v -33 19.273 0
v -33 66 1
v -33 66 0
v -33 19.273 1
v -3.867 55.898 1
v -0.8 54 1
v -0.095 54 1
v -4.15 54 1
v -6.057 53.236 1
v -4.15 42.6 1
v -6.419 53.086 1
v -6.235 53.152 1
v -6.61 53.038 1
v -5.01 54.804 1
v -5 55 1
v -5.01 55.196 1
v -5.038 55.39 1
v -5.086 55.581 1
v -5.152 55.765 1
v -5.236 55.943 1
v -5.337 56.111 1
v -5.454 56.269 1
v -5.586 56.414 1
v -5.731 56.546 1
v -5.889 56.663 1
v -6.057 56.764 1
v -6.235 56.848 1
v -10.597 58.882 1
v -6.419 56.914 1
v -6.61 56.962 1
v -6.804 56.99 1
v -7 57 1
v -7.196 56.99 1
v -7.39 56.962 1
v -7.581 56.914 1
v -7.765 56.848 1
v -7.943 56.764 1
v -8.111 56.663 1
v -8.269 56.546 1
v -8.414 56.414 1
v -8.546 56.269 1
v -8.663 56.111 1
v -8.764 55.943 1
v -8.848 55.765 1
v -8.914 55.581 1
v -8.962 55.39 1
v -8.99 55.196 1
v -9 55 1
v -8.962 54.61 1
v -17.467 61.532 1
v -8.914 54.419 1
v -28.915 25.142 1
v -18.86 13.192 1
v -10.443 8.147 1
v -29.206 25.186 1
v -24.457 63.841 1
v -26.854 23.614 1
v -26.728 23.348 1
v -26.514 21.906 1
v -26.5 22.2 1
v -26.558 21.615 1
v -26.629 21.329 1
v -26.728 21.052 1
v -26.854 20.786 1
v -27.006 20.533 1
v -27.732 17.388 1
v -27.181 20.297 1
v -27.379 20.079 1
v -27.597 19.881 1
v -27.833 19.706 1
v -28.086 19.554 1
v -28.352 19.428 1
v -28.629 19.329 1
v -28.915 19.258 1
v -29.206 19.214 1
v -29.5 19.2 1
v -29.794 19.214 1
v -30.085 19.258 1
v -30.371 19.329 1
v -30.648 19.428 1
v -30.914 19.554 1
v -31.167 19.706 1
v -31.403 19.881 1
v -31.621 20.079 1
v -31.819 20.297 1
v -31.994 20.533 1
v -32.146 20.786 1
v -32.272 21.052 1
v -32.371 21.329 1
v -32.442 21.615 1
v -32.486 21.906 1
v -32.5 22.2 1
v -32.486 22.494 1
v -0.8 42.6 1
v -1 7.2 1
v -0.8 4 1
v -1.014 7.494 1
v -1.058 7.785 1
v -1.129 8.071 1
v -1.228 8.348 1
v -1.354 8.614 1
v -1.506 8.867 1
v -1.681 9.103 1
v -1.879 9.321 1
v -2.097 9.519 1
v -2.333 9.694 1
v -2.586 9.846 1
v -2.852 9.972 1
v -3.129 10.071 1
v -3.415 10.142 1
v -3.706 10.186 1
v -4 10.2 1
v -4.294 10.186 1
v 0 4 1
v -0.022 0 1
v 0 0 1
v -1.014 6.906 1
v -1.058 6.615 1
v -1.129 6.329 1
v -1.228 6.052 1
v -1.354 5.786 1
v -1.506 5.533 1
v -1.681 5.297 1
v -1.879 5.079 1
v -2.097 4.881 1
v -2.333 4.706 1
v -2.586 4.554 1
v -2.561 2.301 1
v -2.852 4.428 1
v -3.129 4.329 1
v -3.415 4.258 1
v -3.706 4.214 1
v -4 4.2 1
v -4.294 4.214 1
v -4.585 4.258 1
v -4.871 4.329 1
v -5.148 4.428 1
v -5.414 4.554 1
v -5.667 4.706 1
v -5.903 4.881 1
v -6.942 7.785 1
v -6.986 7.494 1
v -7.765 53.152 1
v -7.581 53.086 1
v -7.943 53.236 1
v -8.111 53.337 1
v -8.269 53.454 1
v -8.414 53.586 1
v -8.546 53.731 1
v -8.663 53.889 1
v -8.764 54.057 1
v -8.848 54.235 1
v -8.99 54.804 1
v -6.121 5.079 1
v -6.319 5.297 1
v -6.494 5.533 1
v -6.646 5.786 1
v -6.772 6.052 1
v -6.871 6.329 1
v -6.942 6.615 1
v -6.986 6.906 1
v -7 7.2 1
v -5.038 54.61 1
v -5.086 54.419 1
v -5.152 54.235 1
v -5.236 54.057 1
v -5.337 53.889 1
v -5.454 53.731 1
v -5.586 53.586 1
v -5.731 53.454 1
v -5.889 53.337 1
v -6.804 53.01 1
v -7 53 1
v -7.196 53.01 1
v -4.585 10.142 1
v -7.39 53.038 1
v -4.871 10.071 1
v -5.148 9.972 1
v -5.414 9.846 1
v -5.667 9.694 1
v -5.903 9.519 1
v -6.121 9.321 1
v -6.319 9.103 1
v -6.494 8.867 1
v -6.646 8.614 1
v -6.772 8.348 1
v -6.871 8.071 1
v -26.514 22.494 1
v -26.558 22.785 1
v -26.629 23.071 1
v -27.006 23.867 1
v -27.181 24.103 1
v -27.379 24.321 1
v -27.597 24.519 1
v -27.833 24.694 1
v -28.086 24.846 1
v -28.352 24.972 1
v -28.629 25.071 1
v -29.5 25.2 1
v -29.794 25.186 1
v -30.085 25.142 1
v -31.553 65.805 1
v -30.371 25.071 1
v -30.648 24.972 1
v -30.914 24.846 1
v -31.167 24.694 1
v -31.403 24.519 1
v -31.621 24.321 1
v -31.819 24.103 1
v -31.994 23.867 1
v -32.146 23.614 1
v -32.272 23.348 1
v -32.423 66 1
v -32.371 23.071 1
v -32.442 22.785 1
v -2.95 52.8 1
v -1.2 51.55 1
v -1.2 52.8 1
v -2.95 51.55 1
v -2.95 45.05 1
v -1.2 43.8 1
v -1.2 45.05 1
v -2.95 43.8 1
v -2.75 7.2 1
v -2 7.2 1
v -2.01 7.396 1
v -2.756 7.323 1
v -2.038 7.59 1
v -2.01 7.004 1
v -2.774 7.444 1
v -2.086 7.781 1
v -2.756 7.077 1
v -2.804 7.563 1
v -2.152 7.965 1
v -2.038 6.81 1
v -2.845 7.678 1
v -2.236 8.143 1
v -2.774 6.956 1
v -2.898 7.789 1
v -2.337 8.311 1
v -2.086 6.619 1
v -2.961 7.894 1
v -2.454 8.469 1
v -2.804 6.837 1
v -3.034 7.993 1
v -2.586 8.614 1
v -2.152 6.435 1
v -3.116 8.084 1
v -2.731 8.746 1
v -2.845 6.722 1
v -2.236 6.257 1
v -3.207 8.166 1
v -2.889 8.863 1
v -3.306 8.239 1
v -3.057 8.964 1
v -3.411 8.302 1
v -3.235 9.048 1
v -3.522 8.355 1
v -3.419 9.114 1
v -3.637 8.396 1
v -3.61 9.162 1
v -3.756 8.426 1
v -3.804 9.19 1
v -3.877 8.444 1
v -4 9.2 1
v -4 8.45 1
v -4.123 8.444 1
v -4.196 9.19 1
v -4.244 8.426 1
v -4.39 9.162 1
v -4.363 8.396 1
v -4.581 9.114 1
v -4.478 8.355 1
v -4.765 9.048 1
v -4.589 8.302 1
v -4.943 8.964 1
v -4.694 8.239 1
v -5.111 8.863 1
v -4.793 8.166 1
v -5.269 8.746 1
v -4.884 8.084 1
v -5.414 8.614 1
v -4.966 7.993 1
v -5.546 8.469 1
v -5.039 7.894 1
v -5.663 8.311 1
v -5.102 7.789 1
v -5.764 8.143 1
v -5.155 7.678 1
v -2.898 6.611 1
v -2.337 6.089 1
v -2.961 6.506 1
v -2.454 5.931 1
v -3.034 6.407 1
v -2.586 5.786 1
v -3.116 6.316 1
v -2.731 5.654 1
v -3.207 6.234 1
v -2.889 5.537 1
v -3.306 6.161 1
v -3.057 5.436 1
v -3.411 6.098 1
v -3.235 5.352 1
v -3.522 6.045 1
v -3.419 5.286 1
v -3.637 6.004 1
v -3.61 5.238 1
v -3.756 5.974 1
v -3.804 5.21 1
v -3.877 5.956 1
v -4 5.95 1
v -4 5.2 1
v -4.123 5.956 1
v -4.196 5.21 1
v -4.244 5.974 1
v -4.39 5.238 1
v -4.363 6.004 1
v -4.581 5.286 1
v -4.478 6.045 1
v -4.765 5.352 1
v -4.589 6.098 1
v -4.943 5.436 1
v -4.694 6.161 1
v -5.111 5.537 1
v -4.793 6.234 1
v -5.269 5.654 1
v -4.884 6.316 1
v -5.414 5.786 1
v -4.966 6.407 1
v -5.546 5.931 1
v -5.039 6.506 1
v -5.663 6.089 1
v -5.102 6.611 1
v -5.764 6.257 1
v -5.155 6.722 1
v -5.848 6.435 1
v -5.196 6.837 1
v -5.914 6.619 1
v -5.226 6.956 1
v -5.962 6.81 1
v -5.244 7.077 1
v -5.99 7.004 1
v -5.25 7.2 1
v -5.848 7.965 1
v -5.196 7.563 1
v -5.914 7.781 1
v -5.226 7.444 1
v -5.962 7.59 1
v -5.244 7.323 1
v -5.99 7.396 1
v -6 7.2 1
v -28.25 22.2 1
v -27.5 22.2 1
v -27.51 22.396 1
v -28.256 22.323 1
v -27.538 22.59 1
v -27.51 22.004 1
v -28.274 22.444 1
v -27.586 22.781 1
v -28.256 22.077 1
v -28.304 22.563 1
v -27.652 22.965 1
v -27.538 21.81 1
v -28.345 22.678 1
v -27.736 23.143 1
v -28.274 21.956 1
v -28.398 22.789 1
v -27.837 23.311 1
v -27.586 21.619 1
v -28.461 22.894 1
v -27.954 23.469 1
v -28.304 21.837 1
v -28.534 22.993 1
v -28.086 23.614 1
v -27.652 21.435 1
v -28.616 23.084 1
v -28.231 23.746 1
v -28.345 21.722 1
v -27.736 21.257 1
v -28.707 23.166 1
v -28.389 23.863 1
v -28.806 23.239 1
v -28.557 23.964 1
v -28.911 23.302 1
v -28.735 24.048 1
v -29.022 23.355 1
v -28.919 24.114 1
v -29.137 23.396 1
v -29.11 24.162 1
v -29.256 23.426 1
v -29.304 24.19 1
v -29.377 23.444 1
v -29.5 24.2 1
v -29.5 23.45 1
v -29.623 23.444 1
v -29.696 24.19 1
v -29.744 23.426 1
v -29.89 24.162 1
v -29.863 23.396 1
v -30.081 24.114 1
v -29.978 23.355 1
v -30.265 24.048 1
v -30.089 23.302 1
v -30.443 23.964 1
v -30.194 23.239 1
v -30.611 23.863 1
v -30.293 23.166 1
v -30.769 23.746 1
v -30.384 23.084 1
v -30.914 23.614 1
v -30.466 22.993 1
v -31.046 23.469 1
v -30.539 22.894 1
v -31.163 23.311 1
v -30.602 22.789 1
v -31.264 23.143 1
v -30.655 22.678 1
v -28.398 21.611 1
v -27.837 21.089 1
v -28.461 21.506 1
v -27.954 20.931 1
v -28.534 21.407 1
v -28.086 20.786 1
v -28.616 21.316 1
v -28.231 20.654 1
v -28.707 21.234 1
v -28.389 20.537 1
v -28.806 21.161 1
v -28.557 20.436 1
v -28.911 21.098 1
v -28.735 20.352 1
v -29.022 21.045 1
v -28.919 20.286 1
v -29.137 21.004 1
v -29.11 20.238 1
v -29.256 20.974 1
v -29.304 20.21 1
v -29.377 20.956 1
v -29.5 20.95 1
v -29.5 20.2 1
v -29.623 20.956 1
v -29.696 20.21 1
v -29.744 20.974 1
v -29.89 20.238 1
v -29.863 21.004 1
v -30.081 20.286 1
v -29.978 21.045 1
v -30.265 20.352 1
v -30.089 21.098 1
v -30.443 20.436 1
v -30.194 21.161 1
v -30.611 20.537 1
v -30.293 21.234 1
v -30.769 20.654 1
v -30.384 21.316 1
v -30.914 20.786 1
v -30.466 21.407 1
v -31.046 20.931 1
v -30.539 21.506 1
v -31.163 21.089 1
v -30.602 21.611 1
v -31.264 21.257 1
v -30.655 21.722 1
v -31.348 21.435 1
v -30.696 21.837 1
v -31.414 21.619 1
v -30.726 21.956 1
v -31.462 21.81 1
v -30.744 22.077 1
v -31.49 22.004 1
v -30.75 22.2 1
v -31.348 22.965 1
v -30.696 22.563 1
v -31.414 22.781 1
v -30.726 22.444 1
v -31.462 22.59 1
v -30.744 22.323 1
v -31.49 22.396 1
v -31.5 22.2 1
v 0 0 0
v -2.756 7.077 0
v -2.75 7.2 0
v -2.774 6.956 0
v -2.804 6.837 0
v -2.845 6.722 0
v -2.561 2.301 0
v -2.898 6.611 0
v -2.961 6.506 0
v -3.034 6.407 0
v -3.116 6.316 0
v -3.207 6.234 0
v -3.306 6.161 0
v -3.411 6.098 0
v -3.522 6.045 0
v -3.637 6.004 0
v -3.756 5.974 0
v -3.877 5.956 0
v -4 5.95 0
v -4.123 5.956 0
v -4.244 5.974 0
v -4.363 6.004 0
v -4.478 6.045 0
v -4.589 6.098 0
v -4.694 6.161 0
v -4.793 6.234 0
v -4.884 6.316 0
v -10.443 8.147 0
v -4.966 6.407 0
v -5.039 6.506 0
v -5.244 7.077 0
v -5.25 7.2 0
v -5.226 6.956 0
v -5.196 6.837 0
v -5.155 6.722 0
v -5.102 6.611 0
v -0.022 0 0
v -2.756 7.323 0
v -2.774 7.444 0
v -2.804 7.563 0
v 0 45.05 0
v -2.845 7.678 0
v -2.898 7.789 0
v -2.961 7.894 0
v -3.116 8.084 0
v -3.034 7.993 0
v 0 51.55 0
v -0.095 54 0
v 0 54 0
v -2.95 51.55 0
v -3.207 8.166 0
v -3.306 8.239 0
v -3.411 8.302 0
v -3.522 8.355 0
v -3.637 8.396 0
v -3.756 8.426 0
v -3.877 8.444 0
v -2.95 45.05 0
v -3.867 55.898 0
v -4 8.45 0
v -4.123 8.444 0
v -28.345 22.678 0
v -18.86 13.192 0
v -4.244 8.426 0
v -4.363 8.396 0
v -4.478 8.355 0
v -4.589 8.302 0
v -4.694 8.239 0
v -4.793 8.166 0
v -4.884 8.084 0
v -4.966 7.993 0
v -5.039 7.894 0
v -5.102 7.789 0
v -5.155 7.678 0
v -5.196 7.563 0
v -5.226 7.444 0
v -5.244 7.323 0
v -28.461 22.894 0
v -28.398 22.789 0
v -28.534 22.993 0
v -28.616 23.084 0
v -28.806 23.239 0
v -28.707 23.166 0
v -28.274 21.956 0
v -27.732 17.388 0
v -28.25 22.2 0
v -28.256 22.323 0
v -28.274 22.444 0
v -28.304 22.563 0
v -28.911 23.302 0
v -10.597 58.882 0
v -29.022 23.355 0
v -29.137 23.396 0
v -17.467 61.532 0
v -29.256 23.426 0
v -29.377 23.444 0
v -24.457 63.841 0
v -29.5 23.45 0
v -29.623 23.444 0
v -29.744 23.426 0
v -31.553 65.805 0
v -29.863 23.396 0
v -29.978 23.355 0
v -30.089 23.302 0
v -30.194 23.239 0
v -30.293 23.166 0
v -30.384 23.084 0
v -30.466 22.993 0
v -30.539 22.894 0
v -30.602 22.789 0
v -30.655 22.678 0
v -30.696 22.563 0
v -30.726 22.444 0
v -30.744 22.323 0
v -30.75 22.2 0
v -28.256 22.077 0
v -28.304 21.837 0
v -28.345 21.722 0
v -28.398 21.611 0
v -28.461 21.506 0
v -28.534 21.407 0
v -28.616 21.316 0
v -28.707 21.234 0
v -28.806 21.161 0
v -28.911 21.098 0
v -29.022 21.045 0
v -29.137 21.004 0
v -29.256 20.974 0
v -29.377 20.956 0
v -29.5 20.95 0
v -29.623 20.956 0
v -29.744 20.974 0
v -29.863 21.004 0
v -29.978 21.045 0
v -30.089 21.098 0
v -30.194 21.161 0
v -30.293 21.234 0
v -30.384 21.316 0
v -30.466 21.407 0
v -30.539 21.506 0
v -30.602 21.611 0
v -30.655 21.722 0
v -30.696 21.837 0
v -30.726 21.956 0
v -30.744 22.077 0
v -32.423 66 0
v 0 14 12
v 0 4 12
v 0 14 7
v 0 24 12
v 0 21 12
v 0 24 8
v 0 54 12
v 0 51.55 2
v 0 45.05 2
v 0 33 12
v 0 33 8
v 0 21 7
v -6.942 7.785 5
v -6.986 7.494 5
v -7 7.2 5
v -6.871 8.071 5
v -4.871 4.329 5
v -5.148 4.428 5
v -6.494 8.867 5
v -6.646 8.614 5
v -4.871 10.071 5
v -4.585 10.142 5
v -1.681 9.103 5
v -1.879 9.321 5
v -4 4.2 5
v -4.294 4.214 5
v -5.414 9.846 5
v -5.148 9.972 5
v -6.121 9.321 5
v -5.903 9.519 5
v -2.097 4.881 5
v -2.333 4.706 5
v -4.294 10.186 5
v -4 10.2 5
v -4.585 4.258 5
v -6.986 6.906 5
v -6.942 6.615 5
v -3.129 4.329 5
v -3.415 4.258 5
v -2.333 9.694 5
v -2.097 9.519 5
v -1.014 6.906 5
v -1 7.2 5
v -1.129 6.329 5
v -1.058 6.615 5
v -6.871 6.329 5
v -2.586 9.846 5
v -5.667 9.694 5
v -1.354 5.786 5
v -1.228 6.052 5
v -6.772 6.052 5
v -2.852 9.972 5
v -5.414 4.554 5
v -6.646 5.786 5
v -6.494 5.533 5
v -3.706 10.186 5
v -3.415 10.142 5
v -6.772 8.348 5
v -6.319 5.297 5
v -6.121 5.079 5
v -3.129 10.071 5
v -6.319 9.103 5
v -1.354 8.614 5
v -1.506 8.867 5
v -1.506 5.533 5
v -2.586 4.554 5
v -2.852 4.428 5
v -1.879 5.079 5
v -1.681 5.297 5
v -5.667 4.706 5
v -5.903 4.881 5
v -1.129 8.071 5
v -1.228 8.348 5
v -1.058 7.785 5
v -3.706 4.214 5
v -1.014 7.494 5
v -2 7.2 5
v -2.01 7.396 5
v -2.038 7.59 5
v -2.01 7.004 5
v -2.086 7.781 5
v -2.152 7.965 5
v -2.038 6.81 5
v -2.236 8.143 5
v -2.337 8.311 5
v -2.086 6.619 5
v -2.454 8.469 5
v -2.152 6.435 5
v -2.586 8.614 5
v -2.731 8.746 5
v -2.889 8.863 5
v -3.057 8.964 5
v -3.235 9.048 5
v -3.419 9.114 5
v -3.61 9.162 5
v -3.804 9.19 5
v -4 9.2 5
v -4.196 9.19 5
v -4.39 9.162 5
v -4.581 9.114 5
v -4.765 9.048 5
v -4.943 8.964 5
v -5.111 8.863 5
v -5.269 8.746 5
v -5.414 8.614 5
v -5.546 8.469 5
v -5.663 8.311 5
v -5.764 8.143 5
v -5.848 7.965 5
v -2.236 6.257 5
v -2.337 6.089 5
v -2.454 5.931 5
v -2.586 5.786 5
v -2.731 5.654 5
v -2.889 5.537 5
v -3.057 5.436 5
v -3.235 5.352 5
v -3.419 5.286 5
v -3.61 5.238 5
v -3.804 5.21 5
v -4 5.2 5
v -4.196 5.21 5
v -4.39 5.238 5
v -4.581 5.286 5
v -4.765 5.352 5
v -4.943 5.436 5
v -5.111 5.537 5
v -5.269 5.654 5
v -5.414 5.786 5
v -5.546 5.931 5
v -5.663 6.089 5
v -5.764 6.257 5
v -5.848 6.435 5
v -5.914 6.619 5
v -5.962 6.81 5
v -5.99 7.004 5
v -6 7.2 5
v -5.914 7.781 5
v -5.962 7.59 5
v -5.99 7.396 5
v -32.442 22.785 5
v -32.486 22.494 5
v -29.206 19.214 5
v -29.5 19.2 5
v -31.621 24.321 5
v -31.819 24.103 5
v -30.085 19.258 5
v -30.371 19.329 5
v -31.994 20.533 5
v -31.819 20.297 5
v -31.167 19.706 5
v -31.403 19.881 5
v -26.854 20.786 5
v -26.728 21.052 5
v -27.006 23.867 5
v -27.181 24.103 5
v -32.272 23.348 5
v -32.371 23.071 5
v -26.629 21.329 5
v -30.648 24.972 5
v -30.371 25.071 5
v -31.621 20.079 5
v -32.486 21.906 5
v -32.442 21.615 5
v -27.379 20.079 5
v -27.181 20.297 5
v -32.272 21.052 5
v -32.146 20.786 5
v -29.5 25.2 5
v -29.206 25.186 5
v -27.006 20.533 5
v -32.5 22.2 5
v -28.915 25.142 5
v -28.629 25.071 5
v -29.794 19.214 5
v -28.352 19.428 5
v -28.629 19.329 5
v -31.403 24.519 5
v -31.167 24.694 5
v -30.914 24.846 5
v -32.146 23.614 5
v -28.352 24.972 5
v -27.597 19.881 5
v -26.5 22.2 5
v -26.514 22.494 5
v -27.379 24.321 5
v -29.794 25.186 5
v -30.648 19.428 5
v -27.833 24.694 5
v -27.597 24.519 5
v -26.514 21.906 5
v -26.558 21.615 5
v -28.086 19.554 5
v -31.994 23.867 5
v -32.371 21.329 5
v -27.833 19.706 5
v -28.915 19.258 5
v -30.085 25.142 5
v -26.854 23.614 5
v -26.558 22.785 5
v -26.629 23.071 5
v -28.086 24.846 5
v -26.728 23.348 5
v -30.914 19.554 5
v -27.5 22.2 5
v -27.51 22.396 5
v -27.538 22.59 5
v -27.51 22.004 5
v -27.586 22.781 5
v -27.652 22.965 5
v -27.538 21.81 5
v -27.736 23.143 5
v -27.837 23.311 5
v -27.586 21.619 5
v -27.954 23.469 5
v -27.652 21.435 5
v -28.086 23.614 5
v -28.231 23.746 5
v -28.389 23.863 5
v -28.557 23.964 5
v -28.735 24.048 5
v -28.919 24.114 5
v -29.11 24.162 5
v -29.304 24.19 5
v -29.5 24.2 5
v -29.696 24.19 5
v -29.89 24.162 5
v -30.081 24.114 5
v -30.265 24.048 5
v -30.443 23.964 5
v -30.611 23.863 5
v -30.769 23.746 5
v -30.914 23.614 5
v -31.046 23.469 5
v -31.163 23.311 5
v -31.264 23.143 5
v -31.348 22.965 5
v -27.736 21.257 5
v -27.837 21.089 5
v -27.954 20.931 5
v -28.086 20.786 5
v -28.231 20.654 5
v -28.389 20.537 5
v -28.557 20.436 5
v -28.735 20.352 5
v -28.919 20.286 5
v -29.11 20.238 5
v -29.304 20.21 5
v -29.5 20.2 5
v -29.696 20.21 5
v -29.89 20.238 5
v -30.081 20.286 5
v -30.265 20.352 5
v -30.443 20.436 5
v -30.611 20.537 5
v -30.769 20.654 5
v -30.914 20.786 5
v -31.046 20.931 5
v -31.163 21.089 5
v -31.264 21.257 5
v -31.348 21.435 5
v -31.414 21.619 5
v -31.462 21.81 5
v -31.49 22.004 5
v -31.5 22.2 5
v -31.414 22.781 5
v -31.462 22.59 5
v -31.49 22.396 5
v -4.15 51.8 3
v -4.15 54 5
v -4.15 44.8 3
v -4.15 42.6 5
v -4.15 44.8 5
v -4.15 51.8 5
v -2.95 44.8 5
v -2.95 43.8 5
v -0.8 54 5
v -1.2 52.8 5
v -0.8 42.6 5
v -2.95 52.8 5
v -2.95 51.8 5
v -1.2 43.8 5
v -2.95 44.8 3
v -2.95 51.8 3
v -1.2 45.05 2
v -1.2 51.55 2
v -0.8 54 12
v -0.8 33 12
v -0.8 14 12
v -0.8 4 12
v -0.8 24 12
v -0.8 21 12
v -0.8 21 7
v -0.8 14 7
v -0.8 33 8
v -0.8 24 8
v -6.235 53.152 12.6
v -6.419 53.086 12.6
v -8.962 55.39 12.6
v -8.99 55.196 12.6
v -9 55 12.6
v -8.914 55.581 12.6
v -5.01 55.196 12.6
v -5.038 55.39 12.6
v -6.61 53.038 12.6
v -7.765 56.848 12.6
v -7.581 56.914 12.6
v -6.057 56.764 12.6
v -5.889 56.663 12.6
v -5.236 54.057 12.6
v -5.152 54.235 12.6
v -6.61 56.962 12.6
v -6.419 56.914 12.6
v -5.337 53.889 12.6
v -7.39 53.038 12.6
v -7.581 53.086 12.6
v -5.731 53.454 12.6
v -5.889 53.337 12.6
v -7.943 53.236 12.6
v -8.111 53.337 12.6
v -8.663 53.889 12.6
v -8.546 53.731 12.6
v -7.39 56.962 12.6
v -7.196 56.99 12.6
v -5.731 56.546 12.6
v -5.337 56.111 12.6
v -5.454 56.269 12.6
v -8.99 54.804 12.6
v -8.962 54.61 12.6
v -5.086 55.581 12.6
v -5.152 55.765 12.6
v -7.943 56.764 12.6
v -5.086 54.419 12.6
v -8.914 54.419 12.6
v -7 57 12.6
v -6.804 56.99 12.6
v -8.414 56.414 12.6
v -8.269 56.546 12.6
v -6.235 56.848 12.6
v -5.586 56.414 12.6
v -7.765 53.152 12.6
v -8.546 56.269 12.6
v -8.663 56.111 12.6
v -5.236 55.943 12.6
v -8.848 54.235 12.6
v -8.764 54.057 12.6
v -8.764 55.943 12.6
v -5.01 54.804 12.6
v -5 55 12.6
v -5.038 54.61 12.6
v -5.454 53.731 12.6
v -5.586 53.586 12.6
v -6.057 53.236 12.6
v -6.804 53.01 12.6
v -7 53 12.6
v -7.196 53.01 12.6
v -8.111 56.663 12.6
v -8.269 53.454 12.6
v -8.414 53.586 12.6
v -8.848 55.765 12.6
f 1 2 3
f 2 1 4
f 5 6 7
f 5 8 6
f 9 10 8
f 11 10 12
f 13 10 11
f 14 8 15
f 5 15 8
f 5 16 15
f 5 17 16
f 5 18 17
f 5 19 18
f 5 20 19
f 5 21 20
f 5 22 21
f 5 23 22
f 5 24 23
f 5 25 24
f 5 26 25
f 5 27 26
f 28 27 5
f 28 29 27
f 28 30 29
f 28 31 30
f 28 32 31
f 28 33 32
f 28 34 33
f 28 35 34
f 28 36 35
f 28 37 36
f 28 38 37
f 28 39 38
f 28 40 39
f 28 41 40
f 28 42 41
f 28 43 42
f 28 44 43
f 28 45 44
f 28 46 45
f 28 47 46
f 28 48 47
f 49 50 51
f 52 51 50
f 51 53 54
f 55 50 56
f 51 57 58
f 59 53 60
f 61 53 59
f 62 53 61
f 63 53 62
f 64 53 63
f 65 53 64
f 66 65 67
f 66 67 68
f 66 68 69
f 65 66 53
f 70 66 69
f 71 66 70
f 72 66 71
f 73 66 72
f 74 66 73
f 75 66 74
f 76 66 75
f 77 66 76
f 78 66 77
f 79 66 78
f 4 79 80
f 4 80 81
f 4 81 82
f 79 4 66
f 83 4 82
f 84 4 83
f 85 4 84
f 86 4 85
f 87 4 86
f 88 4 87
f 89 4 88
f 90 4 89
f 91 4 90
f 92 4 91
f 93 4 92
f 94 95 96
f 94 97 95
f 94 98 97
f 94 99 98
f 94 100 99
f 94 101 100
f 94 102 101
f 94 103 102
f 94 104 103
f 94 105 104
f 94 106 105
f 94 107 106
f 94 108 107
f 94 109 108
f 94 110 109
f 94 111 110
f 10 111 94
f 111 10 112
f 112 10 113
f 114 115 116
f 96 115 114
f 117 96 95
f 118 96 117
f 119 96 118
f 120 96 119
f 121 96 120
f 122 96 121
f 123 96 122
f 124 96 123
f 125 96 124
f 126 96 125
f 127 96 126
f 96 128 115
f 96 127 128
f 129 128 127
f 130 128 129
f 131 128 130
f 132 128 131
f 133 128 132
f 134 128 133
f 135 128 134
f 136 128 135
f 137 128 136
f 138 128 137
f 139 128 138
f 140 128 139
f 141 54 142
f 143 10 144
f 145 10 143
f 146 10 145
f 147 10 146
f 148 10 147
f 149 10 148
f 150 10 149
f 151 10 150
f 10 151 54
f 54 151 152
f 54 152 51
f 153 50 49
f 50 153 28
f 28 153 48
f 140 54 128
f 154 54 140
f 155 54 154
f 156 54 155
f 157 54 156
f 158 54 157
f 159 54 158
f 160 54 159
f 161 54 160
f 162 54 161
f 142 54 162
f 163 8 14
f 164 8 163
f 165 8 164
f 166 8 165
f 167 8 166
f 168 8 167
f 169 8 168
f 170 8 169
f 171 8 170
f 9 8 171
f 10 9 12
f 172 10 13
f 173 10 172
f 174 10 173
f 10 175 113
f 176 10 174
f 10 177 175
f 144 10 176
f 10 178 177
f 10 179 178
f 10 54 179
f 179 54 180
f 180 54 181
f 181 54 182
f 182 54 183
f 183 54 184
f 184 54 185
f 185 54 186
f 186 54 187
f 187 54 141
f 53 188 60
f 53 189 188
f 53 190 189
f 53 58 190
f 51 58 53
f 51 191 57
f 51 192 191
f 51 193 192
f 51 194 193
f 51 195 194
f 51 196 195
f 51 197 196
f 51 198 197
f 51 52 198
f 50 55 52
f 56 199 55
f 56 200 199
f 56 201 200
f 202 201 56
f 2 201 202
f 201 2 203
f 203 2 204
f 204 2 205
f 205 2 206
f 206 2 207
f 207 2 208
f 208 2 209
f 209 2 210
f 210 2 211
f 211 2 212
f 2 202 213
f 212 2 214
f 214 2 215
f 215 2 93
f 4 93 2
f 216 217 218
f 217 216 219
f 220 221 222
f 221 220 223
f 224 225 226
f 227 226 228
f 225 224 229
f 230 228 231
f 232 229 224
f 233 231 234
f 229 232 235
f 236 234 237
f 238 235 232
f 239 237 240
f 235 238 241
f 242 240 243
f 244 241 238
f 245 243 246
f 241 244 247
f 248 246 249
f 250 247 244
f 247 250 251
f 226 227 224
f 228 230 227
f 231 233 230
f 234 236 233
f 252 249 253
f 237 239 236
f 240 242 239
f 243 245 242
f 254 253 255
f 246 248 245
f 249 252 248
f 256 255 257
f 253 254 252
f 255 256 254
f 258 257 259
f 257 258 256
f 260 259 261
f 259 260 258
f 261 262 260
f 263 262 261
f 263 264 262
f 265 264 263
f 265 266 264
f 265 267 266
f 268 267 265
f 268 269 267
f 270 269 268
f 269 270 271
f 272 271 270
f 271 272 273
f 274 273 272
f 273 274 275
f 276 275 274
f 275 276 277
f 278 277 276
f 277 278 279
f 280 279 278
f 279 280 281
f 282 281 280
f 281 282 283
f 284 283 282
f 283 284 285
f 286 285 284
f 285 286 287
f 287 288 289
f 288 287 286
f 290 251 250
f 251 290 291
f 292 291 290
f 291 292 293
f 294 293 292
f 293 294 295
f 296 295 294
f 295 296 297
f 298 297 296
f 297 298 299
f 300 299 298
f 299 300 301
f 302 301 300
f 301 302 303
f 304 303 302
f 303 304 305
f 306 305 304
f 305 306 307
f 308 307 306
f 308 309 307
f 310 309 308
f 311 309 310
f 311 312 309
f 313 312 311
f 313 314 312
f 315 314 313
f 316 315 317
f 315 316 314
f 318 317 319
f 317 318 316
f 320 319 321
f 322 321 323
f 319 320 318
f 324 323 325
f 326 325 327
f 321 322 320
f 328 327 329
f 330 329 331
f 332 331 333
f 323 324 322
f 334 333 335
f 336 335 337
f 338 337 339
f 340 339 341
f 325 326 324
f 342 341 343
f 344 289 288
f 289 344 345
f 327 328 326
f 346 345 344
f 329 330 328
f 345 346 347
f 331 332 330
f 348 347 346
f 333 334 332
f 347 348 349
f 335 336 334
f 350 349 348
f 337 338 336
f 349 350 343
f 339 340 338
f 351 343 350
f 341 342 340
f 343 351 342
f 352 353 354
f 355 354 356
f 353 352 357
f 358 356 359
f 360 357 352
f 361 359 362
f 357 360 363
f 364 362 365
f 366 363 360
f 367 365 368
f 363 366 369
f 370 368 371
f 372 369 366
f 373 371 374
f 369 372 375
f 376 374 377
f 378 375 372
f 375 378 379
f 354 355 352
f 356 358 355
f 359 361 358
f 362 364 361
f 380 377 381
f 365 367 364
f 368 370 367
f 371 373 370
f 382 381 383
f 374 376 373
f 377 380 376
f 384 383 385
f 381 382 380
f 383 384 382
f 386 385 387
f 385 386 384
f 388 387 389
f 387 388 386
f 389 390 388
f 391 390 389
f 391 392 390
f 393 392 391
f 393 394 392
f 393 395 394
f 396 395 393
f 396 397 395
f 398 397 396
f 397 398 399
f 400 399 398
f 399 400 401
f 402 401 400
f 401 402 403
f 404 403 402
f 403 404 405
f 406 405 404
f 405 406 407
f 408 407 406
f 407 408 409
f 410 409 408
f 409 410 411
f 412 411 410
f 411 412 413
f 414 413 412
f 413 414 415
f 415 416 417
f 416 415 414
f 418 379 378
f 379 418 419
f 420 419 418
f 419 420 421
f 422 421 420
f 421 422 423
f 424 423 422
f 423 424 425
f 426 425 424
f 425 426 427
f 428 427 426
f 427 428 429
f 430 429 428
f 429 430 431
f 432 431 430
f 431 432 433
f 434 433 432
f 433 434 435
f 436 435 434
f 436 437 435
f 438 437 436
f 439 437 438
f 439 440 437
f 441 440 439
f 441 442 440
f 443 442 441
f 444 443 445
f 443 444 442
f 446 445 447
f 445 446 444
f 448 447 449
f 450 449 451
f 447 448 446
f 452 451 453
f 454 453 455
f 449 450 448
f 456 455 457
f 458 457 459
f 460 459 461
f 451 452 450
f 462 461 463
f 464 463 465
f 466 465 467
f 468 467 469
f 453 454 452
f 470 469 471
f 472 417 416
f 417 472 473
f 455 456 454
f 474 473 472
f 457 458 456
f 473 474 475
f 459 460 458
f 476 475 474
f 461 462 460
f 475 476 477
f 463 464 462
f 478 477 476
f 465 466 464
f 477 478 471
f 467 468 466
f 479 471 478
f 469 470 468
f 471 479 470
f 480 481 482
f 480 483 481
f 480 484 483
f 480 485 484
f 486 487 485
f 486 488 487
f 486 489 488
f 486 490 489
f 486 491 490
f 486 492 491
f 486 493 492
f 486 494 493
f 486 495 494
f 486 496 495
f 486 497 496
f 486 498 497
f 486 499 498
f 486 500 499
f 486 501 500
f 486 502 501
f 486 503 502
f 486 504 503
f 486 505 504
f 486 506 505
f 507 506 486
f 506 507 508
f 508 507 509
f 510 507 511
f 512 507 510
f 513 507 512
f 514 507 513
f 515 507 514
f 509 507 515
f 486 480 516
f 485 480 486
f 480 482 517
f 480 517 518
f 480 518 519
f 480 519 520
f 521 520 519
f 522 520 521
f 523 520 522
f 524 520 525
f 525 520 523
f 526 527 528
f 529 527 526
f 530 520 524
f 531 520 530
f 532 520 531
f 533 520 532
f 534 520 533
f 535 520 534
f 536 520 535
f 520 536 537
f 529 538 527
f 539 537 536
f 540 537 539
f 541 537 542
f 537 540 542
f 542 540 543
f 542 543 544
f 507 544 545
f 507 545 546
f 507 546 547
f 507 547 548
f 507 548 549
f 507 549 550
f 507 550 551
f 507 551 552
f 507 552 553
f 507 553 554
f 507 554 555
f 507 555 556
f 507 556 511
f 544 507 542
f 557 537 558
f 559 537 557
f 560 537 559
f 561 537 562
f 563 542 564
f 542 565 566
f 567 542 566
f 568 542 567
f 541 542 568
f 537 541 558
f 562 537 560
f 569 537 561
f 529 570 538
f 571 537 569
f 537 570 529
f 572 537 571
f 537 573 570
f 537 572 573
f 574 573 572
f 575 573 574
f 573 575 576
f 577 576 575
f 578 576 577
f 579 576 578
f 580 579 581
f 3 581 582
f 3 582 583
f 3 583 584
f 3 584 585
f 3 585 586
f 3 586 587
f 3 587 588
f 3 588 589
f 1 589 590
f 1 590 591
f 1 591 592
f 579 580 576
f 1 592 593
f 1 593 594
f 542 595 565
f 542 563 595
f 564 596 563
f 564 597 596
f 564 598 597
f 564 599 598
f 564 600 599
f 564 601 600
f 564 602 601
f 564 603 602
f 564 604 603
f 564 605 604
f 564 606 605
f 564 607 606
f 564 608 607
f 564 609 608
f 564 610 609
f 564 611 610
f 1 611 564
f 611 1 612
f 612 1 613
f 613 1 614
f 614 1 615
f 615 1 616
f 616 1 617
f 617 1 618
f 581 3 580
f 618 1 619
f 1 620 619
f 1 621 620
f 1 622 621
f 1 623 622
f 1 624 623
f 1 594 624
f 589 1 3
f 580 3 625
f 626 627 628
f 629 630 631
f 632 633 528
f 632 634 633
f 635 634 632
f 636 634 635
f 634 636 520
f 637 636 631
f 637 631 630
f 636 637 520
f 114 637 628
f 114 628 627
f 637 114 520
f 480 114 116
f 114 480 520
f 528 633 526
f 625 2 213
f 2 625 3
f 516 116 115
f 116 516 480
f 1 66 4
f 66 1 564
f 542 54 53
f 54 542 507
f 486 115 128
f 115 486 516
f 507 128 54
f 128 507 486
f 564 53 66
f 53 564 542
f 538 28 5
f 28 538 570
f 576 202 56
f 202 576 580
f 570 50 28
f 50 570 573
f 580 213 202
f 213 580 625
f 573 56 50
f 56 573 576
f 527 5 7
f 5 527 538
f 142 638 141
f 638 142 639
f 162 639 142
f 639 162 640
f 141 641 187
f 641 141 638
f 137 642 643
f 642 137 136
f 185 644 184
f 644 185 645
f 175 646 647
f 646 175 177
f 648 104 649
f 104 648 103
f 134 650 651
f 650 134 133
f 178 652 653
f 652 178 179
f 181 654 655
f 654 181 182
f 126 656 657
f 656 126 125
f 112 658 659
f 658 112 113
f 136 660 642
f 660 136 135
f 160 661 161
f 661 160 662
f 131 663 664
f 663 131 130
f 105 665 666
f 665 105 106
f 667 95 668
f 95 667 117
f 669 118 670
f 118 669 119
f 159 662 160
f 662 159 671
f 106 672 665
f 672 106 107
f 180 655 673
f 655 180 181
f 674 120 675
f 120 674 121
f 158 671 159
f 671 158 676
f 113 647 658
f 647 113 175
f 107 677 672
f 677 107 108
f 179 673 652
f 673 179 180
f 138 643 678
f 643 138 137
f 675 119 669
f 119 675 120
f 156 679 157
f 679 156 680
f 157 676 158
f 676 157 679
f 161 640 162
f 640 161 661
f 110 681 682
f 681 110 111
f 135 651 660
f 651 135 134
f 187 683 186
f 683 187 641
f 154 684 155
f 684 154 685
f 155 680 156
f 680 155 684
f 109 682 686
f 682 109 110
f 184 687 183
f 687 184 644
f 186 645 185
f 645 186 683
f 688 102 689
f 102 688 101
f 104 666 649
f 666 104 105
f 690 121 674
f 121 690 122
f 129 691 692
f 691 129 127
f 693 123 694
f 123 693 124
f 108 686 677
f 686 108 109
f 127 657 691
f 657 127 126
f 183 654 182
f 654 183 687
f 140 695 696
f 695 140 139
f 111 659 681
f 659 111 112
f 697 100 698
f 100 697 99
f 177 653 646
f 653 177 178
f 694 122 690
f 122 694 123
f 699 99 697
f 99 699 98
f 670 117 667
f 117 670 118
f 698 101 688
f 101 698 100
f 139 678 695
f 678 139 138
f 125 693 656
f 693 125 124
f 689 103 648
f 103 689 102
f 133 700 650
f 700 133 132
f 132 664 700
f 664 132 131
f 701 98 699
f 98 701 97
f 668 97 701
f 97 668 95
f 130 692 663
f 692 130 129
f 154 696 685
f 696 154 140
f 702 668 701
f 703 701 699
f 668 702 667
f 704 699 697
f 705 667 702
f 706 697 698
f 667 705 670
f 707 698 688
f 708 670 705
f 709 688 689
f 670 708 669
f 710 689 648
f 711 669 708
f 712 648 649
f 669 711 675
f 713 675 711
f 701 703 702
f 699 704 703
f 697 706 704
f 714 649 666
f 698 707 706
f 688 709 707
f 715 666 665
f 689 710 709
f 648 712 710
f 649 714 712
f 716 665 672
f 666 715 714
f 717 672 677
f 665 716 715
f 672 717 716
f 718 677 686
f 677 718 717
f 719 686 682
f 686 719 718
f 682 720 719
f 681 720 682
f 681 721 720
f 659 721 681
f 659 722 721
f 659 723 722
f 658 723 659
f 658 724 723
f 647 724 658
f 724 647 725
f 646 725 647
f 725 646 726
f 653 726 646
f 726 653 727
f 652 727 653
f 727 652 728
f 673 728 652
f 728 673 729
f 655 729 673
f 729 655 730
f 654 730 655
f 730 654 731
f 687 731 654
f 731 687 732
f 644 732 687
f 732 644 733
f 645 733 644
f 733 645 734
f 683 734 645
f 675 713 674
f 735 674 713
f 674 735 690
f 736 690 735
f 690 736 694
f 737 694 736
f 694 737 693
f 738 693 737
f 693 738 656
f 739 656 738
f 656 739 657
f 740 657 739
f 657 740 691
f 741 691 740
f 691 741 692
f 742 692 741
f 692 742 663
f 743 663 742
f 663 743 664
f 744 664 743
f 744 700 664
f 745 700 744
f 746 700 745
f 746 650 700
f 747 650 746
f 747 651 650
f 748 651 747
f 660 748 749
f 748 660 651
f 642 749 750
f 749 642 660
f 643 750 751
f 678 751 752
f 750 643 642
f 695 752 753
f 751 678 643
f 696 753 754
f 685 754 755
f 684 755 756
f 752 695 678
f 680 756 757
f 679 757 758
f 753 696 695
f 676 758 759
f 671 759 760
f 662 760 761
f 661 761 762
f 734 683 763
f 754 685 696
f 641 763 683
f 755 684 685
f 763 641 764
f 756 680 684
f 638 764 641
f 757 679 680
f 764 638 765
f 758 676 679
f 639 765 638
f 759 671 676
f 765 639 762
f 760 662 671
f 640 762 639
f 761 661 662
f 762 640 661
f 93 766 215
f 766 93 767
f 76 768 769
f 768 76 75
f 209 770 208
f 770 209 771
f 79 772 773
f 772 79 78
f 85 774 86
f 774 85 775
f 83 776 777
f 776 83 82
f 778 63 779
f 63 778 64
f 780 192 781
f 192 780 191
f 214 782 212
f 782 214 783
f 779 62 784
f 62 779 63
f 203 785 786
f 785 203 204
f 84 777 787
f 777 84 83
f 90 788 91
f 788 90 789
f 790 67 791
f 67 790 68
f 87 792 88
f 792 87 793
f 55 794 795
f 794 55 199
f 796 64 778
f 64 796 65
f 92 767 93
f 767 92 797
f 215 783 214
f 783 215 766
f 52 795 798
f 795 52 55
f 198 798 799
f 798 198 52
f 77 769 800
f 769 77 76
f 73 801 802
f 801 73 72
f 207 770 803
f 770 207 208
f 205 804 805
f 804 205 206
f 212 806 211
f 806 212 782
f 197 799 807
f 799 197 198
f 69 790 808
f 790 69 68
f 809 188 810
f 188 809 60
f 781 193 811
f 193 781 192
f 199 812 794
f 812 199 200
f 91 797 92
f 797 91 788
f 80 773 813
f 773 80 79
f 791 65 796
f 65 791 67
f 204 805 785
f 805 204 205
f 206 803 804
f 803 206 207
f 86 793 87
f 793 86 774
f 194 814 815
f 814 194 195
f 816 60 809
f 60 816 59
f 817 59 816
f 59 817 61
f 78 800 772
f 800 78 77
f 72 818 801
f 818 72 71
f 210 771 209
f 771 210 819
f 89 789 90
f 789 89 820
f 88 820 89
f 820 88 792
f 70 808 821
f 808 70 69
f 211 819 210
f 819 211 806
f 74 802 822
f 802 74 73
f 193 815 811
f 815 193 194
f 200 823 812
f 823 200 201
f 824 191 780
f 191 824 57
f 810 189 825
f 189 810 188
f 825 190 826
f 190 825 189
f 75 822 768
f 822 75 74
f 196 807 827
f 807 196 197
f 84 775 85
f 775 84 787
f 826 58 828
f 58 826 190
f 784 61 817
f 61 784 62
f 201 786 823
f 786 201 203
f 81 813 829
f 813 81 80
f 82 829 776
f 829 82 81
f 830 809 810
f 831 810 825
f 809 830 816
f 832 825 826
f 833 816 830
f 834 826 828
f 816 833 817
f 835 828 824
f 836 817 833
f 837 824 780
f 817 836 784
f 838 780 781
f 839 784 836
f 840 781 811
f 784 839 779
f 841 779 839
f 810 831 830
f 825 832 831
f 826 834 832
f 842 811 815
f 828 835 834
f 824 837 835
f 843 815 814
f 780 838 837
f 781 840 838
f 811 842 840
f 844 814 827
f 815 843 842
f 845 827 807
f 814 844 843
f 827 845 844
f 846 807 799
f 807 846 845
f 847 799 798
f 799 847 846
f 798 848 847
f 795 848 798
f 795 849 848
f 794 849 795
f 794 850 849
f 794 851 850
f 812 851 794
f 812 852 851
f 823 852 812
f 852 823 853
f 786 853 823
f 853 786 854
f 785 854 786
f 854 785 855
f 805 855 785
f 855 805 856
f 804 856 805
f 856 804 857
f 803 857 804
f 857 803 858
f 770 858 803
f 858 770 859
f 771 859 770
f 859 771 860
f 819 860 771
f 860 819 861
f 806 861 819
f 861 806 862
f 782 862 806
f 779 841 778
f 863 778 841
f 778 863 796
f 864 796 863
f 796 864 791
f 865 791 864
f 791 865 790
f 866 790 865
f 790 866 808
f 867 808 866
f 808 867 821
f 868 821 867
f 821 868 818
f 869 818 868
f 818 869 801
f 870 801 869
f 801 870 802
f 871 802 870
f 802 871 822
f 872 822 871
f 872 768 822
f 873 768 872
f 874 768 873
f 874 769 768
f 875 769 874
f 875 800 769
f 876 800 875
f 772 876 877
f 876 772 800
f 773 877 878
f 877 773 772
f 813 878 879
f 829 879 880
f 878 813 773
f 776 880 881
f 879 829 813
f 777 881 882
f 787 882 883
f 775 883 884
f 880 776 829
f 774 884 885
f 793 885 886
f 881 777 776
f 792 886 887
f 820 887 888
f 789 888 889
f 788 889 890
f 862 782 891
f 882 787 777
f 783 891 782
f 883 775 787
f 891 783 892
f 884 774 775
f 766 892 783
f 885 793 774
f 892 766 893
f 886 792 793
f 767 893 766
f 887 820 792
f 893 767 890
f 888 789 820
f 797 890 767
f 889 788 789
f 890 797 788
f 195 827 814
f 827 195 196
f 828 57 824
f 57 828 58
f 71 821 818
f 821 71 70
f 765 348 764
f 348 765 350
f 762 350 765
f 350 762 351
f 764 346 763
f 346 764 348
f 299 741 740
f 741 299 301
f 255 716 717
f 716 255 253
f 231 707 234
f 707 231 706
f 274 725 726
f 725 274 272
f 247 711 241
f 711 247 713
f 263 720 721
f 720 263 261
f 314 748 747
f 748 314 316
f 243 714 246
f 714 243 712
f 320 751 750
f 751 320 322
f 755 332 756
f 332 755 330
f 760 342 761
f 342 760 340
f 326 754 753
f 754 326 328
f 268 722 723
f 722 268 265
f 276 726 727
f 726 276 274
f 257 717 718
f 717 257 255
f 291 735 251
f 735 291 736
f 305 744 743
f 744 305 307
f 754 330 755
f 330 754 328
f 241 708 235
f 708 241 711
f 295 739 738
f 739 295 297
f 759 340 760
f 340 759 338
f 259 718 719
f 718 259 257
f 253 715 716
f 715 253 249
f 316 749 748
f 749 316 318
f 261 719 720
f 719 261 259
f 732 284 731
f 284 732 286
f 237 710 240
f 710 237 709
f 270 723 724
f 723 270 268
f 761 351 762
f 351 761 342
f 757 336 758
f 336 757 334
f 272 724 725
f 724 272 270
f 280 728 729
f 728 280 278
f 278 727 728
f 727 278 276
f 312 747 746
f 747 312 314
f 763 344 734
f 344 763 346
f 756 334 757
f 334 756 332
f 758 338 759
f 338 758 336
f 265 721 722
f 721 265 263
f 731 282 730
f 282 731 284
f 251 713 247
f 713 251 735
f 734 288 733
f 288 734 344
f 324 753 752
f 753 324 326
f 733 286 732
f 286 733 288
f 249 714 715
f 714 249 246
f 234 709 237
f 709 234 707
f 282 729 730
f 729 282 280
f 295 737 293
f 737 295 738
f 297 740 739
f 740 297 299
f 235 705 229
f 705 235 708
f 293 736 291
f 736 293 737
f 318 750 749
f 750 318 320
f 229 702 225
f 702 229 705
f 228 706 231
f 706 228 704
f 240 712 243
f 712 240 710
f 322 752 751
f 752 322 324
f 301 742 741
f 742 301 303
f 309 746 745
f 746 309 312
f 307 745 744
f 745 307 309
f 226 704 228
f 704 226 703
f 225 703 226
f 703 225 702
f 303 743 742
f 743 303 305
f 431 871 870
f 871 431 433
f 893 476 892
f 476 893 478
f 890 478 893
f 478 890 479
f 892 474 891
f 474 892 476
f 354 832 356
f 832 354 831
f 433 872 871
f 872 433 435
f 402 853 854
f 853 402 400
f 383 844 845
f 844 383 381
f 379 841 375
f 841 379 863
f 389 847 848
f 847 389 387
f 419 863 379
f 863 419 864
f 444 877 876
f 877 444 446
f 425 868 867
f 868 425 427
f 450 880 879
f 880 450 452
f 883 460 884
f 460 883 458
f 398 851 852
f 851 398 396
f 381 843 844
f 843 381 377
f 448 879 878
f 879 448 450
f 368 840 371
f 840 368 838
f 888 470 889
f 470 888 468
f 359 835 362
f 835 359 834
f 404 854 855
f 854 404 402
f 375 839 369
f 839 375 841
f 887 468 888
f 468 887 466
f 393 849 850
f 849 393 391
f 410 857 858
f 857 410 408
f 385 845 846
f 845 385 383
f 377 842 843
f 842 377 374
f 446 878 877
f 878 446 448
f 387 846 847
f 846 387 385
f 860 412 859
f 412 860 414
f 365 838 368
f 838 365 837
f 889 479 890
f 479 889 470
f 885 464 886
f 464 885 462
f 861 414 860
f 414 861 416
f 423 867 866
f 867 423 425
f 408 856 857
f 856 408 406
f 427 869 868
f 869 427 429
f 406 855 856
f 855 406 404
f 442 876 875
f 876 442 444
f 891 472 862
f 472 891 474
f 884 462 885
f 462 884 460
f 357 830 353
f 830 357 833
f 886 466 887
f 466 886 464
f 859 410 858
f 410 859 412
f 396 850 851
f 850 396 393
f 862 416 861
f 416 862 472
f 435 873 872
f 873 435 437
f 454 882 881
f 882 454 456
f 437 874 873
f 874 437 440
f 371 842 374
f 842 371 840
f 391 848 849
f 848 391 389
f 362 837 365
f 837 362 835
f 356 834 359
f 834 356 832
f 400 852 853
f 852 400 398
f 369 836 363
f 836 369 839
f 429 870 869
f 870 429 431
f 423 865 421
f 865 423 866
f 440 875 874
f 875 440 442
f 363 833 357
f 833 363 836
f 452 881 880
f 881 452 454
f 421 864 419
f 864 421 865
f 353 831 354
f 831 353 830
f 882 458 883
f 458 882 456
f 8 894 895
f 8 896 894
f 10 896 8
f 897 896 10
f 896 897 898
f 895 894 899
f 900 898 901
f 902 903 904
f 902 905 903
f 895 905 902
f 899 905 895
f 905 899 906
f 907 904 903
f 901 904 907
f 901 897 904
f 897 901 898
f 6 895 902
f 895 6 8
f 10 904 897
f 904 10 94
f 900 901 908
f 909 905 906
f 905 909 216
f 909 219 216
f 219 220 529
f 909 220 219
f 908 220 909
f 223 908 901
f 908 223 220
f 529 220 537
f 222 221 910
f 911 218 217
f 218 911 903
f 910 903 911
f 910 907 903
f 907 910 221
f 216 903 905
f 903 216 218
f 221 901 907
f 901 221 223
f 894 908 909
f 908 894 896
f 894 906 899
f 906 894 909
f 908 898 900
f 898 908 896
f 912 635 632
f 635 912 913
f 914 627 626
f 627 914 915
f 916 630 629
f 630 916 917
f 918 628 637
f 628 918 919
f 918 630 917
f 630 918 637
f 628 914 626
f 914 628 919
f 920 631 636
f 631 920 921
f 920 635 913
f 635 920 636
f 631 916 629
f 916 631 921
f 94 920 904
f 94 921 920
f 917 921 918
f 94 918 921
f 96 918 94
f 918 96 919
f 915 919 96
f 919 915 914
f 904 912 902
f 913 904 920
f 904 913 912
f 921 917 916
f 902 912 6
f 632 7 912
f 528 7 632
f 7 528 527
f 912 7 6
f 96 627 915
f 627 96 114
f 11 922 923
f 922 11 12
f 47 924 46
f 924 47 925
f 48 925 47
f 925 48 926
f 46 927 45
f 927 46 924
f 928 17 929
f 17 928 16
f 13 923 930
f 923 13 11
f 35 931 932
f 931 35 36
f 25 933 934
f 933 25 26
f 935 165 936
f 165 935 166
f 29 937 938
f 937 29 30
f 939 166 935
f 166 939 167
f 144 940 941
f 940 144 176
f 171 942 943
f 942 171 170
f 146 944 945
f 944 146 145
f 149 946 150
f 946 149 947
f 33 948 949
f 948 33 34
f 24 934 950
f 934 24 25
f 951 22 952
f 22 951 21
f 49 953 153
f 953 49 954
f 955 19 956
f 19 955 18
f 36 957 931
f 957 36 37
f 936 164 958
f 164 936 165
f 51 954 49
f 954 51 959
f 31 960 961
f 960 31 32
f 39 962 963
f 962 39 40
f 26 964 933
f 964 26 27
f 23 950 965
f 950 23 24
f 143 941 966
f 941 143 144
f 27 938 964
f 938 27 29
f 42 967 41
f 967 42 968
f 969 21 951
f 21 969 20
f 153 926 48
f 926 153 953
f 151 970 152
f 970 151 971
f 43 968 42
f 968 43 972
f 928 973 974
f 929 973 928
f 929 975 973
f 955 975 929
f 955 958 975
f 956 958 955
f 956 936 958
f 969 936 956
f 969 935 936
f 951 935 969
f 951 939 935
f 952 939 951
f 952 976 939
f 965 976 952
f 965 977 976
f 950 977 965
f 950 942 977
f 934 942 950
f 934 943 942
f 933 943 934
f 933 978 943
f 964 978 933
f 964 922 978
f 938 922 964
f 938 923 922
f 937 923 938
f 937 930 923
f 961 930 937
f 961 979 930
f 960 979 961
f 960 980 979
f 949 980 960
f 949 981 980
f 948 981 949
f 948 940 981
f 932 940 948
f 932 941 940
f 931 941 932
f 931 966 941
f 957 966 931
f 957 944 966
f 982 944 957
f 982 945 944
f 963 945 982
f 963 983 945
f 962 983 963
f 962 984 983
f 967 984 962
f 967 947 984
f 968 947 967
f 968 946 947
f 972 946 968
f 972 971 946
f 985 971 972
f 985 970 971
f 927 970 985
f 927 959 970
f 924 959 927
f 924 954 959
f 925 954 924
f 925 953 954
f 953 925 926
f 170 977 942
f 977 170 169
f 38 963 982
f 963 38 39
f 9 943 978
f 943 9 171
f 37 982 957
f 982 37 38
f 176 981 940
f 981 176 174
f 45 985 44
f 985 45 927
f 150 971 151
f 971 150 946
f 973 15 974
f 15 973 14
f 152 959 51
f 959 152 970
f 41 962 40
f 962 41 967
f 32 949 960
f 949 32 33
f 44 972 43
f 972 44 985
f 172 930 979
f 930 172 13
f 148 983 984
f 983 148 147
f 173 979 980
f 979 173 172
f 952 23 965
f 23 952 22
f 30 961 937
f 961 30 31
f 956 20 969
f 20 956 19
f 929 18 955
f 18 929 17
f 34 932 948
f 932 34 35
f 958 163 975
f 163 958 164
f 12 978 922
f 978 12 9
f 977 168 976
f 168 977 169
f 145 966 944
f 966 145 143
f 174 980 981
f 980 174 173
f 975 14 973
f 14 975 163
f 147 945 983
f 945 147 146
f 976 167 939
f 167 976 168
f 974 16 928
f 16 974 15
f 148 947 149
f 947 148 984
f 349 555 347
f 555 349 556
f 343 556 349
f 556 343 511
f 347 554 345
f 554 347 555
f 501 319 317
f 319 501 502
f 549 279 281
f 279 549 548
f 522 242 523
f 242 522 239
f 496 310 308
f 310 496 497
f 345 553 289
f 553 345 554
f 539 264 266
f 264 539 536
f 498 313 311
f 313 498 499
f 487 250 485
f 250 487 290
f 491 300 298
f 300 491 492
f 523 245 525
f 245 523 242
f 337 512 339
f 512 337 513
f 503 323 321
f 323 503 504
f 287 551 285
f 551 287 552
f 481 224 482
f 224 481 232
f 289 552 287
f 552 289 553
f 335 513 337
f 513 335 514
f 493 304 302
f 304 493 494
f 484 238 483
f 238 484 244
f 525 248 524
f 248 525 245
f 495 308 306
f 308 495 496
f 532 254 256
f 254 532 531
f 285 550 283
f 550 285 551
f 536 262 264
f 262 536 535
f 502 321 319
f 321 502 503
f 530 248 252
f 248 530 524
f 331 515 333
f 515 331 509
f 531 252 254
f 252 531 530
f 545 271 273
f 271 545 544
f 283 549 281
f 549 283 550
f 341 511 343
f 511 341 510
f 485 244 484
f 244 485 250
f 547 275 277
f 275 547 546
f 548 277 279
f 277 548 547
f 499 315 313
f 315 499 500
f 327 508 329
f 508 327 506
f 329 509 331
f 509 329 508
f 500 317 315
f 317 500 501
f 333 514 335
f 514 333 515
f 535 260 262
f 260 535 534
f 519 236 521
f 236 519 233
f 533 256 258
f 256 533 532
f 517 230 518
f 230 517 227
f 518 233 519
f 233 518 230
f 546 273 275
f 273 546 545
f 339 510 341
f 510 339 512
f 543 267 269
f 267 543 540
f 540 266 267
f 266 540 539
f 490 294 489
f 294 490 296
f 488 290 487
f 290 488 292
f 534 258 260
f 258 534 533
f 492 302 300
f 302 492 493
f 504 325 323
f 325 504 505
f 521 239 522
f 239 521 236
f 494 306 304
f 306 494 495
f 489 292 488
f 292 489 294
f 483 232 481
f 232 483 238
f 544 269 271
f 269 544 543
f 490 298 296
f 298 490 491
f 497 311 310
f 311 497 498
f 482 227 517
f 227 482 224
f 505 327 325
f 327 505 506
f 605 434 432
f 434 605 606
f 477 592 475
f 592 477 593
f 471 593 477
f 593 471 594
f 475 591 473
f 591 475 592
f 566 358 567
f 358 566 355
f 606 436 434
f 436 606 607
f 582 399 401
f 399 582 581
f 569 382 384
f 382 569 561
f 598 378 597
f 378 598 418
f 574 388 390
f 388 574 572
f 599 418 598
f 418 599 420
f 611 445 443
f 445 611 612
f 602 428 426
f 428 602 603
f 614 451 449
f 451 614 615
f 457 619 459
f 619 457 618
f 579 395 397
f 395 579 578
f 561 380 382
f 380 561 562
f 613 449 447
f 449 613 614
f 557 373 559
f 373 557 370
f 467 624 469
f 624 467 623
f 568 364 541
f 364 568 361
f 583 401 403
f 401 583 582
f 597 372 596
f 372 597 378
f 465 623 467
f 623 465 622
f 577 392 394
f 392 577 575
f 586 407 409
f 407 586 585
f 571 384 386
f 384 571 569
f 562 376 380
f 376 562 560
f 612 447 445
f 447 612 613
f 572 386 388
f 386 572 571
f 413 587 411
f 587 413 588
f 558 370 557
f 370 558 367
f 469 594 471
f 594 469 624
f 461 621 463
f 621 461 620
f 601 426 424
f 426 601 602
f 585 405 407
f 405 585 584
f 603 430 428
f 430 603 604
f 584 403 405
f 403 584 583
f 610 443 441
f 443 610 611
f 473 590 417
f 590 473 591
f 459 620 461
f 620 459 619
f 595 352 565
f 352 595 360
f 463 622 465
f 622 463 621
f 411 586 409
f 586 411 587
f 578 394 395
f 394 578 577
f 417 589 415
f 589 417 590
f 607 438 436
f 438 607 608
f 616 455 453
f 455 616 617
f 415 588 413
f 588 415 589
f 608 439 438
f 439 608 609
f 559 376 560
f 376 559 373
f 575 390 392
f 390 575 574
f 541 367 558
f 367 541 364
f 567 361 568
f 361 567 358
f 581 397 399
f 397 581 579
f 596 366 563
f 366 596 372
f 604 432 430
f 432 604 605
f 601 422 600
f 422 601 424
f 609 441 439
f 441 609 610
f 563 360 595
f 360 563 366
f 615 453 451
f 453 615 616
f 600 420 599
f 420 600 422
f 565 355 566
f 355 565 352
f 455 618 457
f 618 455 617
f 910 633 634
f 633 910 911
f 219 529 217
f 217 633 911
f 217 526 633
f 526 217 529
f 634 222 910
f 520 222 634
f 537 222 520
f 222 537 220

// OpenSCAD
thickness = 1;

module cover() {
  intersection() {
    difference() {
      cube([33, 66, thickness]);

      translate([0, 0, -1]) {
        translate([66, -75, 0]) {
          cylinder(h = (2 * thickness) + 1, r = 100, $fn = 64);
        }
      }
    }

    translate([68, -79.7, 0]) {
      cylinder(h = 5, r = 150, $fn = 128);
    }
  }
}

module holes(h = 5, r = 1.25) {
  translate([4, 7.2, 0]) {
    cylinder(h = h, r = r, $fn = 64);
    translate([25.5, 15, 0]) {
      cylinder(h = h, r = r, $fn = 64);
    }
  }
}

module onoff(h = 5, l = 9, w = 1.75, t = 1.2, gap = 2, topgap = 2.5, inner = false) {
  translate([0, 42.6, 0]) {
    if (inner) {
      translate([t - 5, t + (topgap / 2), -1]) {
        cube([w + 5, l - topgap, h - 1]);
      }
    } else {
      difference() {
        cube([w + (2 * t), l + (2 * t), h]);
        translate([t, t, -1]) {
          cube([w, l, h + 2]);
        }
        translate([t, t + 1, thickness + gap]) {
          cube([w + t + 1, l - 2, h]);
        }
      }
    }
  }
}

module corner_cylinder(h = 5, l = 9, w = 1.75, t = 1.2, gap = 2, topgap = 2.5, inner = false) {
  translate([7, 55, 0]) {
    cylinder(h = 12 + .6, r = 2, $fn = 64);
  }
}

module side(h = 12, r = 1.25, gaps = 4) {
  translate([0, 4, 0]) {
    difference() {
      cube([0.8, 50, h]);
      translate([-1, 0, h - gaps]) {
        translate([0, 8, -1]) {
          cube([3, 7, gaps + 1]);
        }
        translate([0, 20, 0]) {
          cube([3, 9, gaps]);
        }
      }
    }
  }
}

module side_right(h = 12, r = 1.25, gaps = 4) {
  translate([0, 4, 0]) {
    difference() {
      cube([0.8, 50, h]);
      translate([-1, 0, h - gaps]) {
        translate([0, 10, -1]) {
          cube([3, 7, gaps + 1]);
        }
        translate([0, 20, 0]) {
          cube([3, 9, gaps]);
        }
      }
    }
  }
}

module left() {
  difference() {
    union() {
      cover();
      difference() {
        holes(h = 5, r = 3);
        translate([0, 0, -1]) {
          holes(h = 10, r = 2);
        }
      }
      onoff();
      side();
      corner_cylinder();
    }
    translate([0, 0, -1]) {
      onoff(inner = true);
      holes(h = 5, r = 1.25);
    }
  }
}

module right() {
  mirror([1, 0, 0]) {
    difference() {
      union() {
        cover();
        difference() {
          holes(h = 5, r = 3);
          translate([0, 0, -1]) {
            holes(h = 10, r = 2);
          }
        }
        onoff();
        side_right();
        corner_cylinder();
      }
      translate([0, 0, -1]) {
        onoff(inner = true);
        holes(h = 5, r = 1.25);
      }
    }
  }
}

right();
